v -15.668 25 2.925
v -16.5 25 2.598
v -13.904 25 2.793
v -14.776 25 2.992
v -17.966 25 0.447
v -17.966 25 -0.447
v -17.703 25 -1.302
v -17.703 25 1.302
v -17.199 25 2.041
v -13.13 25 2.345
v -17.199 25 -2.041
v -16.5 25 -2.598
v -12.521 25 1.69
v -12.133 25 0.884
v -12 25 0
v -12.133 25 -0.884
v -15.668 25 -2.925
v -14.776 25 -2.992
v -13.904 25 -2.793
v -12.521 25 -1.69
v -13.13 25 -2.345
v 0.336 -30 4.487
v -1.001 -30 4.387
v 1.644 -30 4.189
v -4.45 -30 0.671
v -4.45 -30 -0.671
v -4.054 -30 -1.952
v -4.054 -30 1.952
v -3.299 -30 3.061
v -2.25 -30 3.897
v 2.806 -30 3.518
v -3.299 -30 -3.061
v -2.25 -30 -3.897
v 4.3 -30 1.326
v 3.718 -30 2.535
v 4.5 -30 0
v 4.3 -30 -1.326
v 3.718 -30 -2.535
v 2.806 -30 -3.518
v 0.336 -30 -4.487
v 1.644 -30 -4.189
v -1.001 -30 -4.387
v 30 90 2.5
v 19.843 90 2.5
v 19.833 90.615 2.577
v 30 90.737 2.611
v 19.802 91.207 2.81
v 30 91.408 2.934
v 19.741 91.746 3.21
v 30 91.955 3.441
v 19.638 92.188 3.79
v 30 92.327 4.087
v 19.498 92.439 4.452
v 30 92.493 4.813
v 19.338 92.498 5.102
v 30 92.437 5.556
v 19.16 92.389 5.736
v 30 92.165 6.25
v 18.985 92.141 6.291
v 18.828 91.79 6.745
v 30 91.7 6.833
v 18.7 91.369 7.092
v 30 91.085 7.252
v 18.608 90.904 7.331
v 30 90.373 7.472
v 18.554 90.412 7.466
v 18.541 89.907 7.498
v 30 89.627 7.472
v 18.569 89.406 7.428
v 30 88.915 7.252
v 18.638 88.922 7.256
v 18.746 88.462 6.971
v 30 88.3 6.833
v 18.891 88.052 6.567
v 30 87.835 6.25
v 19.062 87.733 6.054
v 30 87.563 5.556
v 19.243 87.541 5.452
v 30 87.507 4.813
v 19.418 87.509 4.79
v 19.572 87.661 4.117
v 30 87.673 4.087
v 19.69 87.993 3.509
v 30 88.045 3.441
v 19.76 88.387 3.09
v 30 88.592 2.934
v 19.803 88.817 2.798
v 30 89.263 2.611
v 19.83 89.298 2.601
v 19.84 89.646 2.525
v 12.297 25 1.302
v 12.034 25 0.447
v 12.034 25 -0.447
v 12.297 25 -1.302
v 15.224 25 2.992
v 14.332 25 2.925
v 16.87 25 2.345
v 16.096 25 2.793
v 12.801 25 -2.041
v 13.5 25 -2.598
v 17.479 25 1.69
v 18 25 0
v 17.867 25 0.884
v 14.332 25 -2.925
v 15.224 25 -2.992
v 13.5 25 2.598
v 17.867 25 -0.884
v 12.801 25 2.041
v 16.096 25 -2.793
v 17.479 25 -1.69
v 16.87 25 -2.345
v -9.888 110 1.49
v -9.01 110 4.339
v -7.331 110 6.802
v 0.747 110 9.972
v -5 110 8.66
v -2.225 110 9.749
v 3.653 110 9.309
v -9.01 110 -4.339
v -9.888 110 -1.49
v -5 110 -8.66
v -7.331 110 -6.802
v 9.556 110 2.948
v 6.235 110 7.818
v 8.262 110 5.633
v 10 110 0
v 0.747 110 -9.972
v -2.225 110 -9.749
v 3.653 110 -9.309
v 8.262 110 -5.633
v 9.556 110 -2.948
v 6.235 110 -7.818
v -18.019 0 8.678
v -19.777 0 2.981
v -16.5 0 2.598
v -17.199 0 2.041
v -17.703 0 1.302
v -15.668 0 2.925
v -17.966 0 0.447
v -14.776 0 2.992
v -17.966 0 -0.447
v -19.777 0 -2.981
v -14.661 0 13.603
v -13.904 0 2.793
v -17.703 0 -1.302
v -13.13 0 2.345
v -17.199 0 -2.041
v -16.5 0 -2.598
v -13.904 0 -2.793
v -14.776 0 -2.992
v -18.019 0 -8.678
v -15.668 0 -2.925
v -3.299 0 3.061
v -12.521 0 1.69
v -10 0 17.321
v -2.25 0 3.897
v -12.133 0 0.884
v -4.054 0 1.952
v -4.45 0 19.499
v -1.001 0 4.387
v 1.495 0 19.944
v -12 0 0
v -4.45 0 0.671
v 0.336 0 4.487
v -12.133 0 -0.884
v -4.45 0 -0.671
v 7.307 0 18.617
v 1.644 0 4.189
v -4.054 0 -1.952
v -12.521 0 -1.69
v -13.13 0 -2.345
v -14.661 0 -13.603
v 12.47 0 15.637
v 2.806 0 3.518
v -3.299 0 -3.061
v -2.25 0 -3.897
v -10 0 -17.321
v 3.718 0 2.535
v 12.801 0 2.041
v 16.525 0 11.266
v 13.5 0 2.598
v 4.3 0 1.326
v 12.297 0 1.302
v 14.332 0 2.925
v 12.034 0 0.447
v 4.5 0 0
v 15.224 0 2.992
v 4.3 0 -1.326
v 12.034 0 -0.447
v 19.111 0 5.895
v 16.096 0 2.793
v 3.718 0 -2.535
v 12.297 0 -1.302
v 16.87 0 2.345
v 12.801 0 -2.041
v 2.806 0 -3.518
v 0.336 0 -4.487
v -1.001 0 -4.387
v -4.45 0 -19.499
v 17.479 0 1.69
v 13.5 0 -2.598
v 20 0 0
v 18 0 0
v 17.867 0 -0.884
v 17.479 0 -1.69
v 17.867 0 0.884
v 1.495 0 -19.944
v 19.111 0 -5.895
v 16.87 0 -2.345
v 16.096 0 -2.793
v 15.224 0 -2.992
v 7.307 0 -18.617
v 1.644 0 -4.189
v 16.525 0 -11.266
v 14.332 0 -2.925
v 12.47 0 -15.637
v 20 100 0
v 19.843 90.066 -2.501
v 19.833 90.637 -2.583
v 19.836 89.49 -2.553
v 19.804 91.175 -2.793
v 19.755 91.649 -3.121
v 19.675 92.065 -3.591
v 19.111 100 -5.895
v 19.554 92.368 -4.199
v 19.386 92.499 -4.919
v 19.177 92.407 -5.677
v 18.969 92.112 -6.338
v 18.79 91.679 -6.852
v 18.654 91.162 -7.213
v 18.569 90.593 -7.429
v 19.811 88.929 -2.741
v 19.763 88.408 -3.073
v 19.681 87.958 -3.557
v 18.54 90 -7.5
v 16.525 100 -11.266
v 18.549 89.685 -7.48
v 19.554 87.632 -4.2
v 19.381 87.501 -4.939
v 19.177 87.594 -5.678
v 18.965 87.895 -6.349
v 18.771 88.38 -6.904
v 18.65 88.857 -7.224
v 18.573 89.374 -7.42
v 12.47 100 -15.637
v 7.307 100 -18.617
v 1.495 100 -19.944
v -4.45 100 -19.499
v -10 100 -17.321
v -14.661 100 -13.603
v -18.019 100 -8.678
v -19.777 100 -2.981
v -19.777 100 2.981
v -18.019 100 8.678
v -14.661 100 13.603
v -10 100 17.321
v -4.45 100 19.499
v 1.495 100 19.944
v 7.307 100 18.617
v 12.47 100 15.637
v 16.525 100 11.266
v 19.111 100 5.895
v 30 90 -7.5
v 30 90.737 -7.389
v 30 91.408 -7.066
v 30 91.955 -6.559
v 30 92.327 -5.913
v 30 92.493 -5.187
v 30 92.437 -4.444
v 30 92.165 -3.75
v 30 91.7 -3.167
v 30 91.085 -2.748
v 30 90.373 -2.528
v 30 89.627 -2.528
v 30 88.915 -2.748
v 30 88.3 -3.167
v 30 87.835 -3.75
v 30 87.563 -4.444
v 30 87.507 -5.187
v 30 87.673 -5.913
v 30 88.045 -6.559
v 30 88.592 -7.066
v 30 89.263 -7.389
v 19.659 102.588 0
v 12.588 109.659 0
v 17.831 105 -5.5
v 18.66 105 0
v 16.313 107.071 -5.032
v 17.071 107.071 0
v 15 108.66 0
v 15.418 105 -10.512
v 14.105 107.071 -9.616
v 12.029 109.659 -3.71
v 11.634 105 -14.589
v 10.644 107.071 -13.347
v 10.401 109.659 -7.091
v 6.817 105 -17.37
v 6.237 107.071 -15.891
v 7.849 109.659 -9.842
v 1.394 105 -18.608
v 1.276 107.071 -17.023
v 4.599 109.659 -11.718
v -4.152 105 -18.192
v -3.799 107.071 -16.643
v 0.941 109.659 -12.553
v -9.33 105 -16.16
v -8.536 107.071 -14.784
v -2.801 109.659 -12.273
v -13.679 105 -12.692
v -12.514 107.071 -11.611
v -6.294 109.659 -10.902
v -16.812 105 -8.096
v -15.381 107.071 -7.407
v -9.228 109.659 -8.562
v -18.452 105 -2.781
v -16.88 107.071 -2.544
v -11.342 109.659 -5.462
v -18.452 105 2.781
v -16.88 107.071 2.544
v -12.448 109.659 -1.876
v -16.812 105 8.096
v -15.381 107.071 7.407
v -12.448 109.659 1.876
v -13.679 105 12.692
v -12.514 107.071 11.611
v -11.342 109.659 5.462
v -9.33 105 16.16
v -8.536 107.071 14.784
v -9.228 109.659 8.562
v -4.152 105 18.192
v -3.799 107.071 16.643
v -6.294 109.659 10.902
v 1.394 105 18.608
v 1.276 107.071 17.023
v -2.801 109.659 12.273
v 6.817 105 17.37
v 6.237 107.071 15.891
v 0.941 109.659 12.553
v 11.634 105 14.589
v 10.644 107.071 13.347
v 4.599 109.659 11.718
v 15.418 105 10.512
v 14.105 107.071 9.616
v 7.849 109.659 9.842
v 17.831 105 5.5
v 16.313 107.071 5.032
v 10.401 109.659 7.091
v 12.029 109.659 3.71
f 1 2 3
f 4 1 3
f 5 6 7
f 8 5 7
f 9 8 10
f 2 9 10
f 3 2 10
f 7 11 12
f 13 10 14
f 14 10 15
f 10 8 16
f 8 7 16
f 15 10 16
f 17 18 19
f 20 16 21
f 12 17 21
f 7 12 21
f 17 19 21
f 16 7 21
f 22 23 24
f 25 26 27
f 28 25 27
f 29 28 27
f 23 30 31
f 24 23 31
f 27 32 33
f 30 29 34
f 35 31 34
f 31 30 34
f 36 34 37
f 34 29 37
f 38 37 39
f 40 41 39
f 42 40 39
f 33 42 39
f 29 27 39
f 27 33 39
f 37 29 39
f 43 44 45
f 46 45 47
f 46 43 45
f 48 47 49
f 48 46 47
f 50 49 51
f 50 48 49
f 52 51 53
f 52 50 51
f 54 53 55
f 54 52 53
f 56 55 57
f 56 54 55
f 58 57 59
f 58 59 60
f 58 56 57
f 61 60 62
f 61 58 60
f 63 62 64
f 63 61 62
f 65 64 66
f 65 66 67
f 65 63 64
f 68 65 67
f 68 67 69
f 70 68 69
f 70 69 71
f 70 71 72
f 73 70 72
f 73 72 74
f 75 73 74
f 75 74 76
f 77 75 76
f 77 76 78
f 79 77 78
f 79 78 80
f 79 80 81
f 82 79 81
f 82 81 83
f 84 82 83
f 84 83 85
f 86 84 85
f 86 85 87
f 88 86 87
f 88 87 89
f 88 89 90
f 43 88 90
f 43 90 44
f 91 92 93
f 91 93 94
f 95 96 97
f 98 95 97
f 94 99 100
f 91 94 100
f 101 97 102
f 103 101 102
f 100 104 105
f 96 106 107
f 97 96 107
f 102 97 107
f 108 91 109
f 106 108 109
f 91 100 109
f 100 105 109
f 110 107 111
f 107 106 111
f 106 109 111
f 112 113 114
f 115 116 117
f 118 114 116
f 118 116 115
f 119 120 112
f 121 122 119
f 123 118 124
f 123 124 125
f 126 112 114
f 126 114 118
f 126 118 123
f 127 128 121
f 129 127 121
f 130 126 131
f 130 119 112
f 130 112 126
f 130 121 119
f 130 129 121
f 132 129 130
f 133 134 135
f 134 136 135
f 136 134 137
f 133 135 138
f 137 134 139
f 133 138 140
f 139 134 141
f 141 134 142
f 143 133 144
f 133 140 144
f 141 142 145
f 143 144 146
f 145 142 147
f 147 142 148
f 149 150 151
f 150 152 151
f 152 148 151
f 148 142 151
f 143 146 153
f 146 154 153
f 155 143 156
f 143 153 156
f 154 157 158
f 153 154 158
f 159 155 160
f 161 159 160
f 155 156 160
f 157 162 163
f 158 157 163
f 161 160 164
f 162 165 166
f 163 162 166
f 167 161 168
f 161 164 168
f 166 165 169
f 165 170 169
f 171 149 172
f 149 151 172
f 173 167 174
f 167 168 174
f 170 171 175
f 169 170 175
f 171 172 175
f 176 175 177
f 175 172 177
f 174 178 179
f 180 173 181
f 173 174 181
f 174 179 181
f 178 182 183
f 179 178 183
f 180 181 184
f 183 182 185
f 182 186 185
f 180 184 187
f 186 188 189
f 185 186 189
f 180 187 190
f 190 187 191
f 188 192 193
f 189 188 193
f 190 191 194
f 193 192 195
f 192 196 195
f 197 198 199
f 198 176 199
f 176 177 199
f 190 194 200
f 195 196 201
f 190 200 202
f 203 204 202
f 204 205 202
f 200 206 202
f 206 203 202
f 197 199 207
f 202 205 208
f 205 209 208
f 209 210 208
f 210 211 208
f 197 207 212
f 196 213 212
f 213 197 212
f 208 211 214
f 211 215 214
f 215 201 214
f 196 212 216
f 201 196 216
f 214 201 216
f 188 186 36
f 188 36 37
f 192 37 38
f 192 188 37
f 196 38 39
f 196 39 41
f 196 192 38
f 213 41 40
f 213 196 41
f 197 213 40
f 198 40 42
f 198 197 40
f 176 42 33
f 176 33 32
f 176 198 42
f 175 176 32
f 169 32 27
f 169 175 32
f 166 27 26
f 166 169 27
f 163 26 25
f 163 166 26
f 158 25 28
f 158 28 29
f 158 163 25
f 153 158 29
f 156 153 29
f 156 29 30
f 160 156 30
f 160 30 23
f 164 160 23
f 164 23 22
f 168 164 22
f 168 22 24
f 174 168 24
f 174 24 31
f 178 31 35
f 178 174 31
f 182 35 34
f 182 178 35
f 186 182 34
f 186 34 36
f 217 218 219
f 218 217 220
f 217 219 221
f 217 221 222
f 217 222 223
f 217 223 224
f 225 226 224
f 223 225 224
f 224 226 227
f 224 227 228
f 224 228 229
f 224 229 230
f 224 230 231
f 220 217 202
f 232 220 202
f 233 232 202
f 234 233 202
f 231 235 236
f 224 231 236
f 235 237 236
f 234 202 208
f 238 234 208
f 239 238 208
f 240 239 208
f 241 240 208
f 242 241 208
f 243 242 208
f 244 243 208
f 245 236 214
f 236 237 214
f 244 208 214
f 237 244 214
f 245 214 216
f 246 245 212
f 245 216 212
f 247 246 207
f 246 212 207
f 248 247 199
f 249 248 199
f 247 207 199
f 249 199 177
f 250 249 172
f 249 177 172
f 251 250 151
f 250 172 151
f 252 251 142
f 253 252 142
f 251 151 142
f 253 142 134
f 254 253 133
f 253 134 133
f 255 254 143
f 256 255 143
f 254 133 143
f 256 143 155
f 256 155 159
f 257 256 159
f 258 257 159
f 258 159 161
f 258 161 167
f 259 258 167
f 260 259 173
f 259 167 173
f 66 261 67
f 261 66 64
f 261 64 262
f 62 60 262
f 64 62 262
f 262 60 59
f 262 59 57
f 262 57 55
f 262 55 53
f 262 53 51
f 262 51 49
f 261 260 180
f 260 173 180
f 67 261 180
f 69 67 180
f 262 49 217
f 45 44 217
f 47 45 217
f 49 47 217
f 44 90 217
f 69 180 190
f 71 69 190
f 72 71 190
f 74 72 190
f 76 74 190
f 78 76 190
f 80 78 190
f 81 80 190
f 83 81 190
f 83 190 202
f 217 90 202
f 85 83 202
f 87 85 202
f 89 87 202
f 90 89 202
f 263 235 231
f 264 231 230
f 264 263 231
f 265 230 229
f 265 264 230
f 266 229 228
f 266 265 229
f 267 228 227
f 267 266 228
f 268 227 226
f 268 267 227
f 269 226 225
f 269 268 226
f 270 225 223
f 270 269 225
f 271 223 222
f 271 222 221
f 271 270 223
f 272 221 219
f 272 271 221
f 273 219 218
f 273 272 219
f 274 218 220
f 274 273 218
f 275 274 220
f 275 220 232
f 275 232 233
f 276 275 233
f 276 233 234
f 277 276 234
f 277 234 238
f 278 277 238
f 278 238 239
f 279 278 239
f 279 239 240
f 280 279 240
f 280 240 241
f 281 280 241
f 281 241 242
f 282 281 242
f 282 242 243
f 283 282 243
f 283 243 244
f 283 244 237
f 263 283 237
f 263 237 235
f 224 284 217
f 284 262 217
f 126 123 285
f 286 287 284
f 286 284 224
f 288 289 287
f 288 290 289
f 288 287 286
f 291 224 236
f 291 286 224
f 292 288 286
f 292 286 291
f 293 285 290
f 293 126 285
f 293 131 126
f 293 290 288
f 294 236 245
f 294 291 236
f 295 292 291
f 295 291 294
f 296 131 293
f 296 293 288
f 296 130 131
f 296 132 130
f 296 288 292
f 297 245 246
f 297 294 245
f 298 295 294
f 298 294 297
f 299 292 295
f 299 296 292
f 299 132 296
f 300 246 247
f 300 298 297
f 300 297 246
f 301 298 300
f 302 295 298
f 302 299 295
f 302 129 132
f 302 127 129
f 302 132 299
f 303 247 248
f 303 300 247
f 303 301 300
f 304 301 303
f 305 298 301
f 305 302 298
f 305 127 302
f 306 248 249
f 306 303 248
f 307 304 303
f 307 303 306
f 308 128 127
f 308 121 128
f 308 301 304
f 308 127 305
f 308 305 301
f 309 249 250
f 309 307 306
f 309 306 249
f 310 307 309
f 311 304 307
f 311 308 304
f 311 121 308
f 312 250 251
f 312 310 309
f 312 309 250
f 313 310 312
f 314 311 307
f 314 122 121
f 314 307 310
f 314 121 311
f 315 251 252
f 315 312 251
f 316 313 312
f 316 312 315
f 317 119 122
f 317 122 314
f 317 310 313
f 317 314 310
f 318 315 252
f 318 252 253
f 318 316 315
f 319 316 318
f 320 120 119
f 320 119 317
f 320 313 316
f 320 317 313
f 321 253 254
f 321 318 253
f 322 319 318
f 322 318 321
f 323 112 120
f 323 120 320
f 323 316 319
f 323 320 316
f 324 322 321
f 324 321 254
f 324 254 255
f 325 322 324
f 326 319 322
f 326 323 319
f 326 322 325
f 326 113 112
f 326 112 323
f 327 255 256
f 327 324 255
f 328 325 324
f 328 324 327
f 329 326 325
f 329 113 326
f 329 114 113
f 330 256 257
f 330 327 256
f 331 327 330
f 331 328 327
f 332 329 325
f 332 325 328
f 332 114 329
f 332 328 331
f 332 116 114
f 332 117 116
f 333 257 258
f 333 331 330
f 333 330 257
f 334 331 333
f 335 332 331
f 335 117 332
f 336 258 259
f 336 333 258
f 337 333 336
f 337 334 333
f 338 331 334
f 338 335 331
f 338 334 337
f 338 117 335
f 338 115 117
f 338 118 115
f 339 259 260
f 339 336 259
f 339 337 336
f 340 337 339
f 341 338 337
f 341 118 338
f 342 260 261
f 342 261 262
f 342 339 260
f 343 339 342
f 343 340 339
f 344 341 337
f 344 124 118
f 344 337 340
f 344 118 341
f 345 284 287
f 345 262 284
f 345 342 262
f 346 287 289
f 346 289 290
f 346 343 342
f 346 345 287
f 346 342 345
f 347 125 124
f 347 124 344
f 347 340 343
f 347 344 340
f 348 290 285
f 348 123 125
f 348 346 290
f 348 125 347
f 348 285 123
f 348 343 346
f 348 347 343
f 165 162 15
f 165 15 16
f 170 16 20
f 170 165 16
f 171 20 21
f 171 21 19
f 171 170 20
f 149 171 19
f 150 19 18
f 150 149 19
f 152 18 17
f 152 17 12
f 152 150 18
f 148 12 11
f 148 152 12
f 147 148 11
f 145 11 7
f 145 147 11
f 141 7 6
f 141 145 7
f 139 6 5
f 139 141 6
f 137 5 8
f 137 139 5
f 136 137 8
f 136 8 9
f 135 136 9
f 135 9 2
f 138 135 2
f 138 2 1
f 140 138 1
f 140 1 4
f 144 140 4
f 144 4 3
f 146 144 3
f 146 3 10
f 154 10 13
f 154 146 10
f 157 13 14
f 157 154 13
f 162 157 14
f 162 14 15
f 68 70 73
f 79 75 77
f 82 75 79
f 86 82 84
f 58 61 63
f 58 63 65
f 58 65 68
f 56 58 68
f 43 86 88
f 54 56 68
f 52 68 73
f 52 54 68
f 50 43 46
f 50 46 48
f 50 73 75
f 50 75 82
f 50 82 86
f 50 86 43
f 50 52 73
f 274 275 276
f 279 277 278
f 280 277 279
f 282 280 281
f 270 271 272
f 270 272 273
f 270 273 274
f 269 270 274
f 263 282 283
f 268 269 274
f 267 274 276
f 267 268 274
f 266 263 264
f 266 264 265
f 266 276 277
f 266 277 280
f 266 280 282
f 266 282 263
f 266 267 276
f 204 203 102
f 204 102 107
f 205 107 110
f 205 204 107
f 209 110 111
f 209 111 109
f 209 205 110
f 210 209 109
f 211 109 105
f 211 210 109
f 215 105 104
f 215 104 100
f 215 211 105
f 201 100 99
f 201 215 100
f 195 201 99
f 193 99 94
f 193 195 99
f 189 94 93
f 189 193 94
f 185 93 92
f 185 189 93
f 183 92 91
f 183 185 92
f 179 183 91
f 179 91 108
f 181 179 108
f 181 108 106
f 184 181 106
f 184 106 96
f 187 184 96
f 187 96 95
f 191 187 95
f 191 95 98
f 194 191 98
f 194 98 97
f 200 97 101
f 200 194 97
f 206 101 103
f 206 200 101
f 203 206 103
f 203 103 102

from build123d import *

# Parameters (mm, degrees)
SKETCH1_R           = 20
BOSS_EXTRUDE1_DEPTH = 110
SKETCH2_R           = 3
CUT_EXTRUDE1_DEPTH  = 25
SKETCH3_R           = 4.5
BOSS_EXTRUDE2_DEPTH = 30
FILLET1_R           = 10
BOSS_EXTRUDE3_REACH = 52
SKETCH4_R           = 2.5


with BuildPart() as part:
    # Sketch1 → Boss-Extrude1 (new body)
    with BuildSketch(Plane(origin=(0, 0, 0), x_dir=(1, 0, 0), z_dir=(0, 1, 0))):
        Circle(SKETCH1_R)
    extrude(amount=BOSS_EXTRUDE1_DEPTH)

    # Sketch2 → Cut-Extrude1 (cut)
    with BuildSketch(Plane(origin=(0, 0, 0), x_dir=(1, 0, 0), z_dir=(0, 1, 0))):
        with Locations((15, 0)):
            Circle(SKETCH2_R)
        with Locations((-15, 0)):
            Circle(SKETCH2_R)
    extrude(amount=CUT_EXTRUDE1_DEPTH, mode=Mode.SUBTRACT)

    # Sketch3 → Boss-Extrude2 (add)
    with BuildSketch(Plane(origin=(0, 0, 0), x_dir=(1, 0, 0), z_dir=(0, 1, 0))):
        Circle(SKETCH3_R)
    extrude(amount=-BOSS_EXTRUDE2_DEPTH)

    # Fillet1
    fillet1_edges = [part.edges().sort_by_distance(p)[0] for p in [
        (-20, 110, 0),
    ]]
    fillet(fillet1_edges, radius=FILLET1_R)

    # Sketch4 → Boss-Extrude3 (add, up to next)
    with BuildSketch(Plane(origin=(30, 0, 0), x_dir=(0, 0, -1), z_dir=(1, 0, 0)), mode=Mode.PRIVATE) as boss_extrude3_sk1:
        with Locations((5, 90)):
            Circle(SKETCH4_R)
    boss_extrude3_tool1 = extrude(boss_extrude3_sk1.sketch, amount=-BOSS_EXTRUDE3_REACH, mode=Mode.PRIVATE) - part.part
    add(boss_extrude3_tool1.solids().sort_by_distance((30, 90, -5))[0])
    # Sketch4 → Boss-Extrude3 (add, up to next)
    with BuildSketch(Plane(origin=(30, 0, 0), x_dir=(0, 0, -1), z_dir=(1, 0, 0)), mode=Mode.PRIVATE) as boss_extrude3_sk2:
        with Locations((-5, 90)):
            Circle(SKETCH4_R)
    boss_extrude3_tool2 = extrude(boss_extrude3_sk2.sketch, amount=-BOSS_EXTRUDE3_REACH, mode=Mode.PRIVATE) - part.part
    add(boss_extrude3_tool2.solids().sort_by_distance((30, 90, 5))[0])


solid = part.part
